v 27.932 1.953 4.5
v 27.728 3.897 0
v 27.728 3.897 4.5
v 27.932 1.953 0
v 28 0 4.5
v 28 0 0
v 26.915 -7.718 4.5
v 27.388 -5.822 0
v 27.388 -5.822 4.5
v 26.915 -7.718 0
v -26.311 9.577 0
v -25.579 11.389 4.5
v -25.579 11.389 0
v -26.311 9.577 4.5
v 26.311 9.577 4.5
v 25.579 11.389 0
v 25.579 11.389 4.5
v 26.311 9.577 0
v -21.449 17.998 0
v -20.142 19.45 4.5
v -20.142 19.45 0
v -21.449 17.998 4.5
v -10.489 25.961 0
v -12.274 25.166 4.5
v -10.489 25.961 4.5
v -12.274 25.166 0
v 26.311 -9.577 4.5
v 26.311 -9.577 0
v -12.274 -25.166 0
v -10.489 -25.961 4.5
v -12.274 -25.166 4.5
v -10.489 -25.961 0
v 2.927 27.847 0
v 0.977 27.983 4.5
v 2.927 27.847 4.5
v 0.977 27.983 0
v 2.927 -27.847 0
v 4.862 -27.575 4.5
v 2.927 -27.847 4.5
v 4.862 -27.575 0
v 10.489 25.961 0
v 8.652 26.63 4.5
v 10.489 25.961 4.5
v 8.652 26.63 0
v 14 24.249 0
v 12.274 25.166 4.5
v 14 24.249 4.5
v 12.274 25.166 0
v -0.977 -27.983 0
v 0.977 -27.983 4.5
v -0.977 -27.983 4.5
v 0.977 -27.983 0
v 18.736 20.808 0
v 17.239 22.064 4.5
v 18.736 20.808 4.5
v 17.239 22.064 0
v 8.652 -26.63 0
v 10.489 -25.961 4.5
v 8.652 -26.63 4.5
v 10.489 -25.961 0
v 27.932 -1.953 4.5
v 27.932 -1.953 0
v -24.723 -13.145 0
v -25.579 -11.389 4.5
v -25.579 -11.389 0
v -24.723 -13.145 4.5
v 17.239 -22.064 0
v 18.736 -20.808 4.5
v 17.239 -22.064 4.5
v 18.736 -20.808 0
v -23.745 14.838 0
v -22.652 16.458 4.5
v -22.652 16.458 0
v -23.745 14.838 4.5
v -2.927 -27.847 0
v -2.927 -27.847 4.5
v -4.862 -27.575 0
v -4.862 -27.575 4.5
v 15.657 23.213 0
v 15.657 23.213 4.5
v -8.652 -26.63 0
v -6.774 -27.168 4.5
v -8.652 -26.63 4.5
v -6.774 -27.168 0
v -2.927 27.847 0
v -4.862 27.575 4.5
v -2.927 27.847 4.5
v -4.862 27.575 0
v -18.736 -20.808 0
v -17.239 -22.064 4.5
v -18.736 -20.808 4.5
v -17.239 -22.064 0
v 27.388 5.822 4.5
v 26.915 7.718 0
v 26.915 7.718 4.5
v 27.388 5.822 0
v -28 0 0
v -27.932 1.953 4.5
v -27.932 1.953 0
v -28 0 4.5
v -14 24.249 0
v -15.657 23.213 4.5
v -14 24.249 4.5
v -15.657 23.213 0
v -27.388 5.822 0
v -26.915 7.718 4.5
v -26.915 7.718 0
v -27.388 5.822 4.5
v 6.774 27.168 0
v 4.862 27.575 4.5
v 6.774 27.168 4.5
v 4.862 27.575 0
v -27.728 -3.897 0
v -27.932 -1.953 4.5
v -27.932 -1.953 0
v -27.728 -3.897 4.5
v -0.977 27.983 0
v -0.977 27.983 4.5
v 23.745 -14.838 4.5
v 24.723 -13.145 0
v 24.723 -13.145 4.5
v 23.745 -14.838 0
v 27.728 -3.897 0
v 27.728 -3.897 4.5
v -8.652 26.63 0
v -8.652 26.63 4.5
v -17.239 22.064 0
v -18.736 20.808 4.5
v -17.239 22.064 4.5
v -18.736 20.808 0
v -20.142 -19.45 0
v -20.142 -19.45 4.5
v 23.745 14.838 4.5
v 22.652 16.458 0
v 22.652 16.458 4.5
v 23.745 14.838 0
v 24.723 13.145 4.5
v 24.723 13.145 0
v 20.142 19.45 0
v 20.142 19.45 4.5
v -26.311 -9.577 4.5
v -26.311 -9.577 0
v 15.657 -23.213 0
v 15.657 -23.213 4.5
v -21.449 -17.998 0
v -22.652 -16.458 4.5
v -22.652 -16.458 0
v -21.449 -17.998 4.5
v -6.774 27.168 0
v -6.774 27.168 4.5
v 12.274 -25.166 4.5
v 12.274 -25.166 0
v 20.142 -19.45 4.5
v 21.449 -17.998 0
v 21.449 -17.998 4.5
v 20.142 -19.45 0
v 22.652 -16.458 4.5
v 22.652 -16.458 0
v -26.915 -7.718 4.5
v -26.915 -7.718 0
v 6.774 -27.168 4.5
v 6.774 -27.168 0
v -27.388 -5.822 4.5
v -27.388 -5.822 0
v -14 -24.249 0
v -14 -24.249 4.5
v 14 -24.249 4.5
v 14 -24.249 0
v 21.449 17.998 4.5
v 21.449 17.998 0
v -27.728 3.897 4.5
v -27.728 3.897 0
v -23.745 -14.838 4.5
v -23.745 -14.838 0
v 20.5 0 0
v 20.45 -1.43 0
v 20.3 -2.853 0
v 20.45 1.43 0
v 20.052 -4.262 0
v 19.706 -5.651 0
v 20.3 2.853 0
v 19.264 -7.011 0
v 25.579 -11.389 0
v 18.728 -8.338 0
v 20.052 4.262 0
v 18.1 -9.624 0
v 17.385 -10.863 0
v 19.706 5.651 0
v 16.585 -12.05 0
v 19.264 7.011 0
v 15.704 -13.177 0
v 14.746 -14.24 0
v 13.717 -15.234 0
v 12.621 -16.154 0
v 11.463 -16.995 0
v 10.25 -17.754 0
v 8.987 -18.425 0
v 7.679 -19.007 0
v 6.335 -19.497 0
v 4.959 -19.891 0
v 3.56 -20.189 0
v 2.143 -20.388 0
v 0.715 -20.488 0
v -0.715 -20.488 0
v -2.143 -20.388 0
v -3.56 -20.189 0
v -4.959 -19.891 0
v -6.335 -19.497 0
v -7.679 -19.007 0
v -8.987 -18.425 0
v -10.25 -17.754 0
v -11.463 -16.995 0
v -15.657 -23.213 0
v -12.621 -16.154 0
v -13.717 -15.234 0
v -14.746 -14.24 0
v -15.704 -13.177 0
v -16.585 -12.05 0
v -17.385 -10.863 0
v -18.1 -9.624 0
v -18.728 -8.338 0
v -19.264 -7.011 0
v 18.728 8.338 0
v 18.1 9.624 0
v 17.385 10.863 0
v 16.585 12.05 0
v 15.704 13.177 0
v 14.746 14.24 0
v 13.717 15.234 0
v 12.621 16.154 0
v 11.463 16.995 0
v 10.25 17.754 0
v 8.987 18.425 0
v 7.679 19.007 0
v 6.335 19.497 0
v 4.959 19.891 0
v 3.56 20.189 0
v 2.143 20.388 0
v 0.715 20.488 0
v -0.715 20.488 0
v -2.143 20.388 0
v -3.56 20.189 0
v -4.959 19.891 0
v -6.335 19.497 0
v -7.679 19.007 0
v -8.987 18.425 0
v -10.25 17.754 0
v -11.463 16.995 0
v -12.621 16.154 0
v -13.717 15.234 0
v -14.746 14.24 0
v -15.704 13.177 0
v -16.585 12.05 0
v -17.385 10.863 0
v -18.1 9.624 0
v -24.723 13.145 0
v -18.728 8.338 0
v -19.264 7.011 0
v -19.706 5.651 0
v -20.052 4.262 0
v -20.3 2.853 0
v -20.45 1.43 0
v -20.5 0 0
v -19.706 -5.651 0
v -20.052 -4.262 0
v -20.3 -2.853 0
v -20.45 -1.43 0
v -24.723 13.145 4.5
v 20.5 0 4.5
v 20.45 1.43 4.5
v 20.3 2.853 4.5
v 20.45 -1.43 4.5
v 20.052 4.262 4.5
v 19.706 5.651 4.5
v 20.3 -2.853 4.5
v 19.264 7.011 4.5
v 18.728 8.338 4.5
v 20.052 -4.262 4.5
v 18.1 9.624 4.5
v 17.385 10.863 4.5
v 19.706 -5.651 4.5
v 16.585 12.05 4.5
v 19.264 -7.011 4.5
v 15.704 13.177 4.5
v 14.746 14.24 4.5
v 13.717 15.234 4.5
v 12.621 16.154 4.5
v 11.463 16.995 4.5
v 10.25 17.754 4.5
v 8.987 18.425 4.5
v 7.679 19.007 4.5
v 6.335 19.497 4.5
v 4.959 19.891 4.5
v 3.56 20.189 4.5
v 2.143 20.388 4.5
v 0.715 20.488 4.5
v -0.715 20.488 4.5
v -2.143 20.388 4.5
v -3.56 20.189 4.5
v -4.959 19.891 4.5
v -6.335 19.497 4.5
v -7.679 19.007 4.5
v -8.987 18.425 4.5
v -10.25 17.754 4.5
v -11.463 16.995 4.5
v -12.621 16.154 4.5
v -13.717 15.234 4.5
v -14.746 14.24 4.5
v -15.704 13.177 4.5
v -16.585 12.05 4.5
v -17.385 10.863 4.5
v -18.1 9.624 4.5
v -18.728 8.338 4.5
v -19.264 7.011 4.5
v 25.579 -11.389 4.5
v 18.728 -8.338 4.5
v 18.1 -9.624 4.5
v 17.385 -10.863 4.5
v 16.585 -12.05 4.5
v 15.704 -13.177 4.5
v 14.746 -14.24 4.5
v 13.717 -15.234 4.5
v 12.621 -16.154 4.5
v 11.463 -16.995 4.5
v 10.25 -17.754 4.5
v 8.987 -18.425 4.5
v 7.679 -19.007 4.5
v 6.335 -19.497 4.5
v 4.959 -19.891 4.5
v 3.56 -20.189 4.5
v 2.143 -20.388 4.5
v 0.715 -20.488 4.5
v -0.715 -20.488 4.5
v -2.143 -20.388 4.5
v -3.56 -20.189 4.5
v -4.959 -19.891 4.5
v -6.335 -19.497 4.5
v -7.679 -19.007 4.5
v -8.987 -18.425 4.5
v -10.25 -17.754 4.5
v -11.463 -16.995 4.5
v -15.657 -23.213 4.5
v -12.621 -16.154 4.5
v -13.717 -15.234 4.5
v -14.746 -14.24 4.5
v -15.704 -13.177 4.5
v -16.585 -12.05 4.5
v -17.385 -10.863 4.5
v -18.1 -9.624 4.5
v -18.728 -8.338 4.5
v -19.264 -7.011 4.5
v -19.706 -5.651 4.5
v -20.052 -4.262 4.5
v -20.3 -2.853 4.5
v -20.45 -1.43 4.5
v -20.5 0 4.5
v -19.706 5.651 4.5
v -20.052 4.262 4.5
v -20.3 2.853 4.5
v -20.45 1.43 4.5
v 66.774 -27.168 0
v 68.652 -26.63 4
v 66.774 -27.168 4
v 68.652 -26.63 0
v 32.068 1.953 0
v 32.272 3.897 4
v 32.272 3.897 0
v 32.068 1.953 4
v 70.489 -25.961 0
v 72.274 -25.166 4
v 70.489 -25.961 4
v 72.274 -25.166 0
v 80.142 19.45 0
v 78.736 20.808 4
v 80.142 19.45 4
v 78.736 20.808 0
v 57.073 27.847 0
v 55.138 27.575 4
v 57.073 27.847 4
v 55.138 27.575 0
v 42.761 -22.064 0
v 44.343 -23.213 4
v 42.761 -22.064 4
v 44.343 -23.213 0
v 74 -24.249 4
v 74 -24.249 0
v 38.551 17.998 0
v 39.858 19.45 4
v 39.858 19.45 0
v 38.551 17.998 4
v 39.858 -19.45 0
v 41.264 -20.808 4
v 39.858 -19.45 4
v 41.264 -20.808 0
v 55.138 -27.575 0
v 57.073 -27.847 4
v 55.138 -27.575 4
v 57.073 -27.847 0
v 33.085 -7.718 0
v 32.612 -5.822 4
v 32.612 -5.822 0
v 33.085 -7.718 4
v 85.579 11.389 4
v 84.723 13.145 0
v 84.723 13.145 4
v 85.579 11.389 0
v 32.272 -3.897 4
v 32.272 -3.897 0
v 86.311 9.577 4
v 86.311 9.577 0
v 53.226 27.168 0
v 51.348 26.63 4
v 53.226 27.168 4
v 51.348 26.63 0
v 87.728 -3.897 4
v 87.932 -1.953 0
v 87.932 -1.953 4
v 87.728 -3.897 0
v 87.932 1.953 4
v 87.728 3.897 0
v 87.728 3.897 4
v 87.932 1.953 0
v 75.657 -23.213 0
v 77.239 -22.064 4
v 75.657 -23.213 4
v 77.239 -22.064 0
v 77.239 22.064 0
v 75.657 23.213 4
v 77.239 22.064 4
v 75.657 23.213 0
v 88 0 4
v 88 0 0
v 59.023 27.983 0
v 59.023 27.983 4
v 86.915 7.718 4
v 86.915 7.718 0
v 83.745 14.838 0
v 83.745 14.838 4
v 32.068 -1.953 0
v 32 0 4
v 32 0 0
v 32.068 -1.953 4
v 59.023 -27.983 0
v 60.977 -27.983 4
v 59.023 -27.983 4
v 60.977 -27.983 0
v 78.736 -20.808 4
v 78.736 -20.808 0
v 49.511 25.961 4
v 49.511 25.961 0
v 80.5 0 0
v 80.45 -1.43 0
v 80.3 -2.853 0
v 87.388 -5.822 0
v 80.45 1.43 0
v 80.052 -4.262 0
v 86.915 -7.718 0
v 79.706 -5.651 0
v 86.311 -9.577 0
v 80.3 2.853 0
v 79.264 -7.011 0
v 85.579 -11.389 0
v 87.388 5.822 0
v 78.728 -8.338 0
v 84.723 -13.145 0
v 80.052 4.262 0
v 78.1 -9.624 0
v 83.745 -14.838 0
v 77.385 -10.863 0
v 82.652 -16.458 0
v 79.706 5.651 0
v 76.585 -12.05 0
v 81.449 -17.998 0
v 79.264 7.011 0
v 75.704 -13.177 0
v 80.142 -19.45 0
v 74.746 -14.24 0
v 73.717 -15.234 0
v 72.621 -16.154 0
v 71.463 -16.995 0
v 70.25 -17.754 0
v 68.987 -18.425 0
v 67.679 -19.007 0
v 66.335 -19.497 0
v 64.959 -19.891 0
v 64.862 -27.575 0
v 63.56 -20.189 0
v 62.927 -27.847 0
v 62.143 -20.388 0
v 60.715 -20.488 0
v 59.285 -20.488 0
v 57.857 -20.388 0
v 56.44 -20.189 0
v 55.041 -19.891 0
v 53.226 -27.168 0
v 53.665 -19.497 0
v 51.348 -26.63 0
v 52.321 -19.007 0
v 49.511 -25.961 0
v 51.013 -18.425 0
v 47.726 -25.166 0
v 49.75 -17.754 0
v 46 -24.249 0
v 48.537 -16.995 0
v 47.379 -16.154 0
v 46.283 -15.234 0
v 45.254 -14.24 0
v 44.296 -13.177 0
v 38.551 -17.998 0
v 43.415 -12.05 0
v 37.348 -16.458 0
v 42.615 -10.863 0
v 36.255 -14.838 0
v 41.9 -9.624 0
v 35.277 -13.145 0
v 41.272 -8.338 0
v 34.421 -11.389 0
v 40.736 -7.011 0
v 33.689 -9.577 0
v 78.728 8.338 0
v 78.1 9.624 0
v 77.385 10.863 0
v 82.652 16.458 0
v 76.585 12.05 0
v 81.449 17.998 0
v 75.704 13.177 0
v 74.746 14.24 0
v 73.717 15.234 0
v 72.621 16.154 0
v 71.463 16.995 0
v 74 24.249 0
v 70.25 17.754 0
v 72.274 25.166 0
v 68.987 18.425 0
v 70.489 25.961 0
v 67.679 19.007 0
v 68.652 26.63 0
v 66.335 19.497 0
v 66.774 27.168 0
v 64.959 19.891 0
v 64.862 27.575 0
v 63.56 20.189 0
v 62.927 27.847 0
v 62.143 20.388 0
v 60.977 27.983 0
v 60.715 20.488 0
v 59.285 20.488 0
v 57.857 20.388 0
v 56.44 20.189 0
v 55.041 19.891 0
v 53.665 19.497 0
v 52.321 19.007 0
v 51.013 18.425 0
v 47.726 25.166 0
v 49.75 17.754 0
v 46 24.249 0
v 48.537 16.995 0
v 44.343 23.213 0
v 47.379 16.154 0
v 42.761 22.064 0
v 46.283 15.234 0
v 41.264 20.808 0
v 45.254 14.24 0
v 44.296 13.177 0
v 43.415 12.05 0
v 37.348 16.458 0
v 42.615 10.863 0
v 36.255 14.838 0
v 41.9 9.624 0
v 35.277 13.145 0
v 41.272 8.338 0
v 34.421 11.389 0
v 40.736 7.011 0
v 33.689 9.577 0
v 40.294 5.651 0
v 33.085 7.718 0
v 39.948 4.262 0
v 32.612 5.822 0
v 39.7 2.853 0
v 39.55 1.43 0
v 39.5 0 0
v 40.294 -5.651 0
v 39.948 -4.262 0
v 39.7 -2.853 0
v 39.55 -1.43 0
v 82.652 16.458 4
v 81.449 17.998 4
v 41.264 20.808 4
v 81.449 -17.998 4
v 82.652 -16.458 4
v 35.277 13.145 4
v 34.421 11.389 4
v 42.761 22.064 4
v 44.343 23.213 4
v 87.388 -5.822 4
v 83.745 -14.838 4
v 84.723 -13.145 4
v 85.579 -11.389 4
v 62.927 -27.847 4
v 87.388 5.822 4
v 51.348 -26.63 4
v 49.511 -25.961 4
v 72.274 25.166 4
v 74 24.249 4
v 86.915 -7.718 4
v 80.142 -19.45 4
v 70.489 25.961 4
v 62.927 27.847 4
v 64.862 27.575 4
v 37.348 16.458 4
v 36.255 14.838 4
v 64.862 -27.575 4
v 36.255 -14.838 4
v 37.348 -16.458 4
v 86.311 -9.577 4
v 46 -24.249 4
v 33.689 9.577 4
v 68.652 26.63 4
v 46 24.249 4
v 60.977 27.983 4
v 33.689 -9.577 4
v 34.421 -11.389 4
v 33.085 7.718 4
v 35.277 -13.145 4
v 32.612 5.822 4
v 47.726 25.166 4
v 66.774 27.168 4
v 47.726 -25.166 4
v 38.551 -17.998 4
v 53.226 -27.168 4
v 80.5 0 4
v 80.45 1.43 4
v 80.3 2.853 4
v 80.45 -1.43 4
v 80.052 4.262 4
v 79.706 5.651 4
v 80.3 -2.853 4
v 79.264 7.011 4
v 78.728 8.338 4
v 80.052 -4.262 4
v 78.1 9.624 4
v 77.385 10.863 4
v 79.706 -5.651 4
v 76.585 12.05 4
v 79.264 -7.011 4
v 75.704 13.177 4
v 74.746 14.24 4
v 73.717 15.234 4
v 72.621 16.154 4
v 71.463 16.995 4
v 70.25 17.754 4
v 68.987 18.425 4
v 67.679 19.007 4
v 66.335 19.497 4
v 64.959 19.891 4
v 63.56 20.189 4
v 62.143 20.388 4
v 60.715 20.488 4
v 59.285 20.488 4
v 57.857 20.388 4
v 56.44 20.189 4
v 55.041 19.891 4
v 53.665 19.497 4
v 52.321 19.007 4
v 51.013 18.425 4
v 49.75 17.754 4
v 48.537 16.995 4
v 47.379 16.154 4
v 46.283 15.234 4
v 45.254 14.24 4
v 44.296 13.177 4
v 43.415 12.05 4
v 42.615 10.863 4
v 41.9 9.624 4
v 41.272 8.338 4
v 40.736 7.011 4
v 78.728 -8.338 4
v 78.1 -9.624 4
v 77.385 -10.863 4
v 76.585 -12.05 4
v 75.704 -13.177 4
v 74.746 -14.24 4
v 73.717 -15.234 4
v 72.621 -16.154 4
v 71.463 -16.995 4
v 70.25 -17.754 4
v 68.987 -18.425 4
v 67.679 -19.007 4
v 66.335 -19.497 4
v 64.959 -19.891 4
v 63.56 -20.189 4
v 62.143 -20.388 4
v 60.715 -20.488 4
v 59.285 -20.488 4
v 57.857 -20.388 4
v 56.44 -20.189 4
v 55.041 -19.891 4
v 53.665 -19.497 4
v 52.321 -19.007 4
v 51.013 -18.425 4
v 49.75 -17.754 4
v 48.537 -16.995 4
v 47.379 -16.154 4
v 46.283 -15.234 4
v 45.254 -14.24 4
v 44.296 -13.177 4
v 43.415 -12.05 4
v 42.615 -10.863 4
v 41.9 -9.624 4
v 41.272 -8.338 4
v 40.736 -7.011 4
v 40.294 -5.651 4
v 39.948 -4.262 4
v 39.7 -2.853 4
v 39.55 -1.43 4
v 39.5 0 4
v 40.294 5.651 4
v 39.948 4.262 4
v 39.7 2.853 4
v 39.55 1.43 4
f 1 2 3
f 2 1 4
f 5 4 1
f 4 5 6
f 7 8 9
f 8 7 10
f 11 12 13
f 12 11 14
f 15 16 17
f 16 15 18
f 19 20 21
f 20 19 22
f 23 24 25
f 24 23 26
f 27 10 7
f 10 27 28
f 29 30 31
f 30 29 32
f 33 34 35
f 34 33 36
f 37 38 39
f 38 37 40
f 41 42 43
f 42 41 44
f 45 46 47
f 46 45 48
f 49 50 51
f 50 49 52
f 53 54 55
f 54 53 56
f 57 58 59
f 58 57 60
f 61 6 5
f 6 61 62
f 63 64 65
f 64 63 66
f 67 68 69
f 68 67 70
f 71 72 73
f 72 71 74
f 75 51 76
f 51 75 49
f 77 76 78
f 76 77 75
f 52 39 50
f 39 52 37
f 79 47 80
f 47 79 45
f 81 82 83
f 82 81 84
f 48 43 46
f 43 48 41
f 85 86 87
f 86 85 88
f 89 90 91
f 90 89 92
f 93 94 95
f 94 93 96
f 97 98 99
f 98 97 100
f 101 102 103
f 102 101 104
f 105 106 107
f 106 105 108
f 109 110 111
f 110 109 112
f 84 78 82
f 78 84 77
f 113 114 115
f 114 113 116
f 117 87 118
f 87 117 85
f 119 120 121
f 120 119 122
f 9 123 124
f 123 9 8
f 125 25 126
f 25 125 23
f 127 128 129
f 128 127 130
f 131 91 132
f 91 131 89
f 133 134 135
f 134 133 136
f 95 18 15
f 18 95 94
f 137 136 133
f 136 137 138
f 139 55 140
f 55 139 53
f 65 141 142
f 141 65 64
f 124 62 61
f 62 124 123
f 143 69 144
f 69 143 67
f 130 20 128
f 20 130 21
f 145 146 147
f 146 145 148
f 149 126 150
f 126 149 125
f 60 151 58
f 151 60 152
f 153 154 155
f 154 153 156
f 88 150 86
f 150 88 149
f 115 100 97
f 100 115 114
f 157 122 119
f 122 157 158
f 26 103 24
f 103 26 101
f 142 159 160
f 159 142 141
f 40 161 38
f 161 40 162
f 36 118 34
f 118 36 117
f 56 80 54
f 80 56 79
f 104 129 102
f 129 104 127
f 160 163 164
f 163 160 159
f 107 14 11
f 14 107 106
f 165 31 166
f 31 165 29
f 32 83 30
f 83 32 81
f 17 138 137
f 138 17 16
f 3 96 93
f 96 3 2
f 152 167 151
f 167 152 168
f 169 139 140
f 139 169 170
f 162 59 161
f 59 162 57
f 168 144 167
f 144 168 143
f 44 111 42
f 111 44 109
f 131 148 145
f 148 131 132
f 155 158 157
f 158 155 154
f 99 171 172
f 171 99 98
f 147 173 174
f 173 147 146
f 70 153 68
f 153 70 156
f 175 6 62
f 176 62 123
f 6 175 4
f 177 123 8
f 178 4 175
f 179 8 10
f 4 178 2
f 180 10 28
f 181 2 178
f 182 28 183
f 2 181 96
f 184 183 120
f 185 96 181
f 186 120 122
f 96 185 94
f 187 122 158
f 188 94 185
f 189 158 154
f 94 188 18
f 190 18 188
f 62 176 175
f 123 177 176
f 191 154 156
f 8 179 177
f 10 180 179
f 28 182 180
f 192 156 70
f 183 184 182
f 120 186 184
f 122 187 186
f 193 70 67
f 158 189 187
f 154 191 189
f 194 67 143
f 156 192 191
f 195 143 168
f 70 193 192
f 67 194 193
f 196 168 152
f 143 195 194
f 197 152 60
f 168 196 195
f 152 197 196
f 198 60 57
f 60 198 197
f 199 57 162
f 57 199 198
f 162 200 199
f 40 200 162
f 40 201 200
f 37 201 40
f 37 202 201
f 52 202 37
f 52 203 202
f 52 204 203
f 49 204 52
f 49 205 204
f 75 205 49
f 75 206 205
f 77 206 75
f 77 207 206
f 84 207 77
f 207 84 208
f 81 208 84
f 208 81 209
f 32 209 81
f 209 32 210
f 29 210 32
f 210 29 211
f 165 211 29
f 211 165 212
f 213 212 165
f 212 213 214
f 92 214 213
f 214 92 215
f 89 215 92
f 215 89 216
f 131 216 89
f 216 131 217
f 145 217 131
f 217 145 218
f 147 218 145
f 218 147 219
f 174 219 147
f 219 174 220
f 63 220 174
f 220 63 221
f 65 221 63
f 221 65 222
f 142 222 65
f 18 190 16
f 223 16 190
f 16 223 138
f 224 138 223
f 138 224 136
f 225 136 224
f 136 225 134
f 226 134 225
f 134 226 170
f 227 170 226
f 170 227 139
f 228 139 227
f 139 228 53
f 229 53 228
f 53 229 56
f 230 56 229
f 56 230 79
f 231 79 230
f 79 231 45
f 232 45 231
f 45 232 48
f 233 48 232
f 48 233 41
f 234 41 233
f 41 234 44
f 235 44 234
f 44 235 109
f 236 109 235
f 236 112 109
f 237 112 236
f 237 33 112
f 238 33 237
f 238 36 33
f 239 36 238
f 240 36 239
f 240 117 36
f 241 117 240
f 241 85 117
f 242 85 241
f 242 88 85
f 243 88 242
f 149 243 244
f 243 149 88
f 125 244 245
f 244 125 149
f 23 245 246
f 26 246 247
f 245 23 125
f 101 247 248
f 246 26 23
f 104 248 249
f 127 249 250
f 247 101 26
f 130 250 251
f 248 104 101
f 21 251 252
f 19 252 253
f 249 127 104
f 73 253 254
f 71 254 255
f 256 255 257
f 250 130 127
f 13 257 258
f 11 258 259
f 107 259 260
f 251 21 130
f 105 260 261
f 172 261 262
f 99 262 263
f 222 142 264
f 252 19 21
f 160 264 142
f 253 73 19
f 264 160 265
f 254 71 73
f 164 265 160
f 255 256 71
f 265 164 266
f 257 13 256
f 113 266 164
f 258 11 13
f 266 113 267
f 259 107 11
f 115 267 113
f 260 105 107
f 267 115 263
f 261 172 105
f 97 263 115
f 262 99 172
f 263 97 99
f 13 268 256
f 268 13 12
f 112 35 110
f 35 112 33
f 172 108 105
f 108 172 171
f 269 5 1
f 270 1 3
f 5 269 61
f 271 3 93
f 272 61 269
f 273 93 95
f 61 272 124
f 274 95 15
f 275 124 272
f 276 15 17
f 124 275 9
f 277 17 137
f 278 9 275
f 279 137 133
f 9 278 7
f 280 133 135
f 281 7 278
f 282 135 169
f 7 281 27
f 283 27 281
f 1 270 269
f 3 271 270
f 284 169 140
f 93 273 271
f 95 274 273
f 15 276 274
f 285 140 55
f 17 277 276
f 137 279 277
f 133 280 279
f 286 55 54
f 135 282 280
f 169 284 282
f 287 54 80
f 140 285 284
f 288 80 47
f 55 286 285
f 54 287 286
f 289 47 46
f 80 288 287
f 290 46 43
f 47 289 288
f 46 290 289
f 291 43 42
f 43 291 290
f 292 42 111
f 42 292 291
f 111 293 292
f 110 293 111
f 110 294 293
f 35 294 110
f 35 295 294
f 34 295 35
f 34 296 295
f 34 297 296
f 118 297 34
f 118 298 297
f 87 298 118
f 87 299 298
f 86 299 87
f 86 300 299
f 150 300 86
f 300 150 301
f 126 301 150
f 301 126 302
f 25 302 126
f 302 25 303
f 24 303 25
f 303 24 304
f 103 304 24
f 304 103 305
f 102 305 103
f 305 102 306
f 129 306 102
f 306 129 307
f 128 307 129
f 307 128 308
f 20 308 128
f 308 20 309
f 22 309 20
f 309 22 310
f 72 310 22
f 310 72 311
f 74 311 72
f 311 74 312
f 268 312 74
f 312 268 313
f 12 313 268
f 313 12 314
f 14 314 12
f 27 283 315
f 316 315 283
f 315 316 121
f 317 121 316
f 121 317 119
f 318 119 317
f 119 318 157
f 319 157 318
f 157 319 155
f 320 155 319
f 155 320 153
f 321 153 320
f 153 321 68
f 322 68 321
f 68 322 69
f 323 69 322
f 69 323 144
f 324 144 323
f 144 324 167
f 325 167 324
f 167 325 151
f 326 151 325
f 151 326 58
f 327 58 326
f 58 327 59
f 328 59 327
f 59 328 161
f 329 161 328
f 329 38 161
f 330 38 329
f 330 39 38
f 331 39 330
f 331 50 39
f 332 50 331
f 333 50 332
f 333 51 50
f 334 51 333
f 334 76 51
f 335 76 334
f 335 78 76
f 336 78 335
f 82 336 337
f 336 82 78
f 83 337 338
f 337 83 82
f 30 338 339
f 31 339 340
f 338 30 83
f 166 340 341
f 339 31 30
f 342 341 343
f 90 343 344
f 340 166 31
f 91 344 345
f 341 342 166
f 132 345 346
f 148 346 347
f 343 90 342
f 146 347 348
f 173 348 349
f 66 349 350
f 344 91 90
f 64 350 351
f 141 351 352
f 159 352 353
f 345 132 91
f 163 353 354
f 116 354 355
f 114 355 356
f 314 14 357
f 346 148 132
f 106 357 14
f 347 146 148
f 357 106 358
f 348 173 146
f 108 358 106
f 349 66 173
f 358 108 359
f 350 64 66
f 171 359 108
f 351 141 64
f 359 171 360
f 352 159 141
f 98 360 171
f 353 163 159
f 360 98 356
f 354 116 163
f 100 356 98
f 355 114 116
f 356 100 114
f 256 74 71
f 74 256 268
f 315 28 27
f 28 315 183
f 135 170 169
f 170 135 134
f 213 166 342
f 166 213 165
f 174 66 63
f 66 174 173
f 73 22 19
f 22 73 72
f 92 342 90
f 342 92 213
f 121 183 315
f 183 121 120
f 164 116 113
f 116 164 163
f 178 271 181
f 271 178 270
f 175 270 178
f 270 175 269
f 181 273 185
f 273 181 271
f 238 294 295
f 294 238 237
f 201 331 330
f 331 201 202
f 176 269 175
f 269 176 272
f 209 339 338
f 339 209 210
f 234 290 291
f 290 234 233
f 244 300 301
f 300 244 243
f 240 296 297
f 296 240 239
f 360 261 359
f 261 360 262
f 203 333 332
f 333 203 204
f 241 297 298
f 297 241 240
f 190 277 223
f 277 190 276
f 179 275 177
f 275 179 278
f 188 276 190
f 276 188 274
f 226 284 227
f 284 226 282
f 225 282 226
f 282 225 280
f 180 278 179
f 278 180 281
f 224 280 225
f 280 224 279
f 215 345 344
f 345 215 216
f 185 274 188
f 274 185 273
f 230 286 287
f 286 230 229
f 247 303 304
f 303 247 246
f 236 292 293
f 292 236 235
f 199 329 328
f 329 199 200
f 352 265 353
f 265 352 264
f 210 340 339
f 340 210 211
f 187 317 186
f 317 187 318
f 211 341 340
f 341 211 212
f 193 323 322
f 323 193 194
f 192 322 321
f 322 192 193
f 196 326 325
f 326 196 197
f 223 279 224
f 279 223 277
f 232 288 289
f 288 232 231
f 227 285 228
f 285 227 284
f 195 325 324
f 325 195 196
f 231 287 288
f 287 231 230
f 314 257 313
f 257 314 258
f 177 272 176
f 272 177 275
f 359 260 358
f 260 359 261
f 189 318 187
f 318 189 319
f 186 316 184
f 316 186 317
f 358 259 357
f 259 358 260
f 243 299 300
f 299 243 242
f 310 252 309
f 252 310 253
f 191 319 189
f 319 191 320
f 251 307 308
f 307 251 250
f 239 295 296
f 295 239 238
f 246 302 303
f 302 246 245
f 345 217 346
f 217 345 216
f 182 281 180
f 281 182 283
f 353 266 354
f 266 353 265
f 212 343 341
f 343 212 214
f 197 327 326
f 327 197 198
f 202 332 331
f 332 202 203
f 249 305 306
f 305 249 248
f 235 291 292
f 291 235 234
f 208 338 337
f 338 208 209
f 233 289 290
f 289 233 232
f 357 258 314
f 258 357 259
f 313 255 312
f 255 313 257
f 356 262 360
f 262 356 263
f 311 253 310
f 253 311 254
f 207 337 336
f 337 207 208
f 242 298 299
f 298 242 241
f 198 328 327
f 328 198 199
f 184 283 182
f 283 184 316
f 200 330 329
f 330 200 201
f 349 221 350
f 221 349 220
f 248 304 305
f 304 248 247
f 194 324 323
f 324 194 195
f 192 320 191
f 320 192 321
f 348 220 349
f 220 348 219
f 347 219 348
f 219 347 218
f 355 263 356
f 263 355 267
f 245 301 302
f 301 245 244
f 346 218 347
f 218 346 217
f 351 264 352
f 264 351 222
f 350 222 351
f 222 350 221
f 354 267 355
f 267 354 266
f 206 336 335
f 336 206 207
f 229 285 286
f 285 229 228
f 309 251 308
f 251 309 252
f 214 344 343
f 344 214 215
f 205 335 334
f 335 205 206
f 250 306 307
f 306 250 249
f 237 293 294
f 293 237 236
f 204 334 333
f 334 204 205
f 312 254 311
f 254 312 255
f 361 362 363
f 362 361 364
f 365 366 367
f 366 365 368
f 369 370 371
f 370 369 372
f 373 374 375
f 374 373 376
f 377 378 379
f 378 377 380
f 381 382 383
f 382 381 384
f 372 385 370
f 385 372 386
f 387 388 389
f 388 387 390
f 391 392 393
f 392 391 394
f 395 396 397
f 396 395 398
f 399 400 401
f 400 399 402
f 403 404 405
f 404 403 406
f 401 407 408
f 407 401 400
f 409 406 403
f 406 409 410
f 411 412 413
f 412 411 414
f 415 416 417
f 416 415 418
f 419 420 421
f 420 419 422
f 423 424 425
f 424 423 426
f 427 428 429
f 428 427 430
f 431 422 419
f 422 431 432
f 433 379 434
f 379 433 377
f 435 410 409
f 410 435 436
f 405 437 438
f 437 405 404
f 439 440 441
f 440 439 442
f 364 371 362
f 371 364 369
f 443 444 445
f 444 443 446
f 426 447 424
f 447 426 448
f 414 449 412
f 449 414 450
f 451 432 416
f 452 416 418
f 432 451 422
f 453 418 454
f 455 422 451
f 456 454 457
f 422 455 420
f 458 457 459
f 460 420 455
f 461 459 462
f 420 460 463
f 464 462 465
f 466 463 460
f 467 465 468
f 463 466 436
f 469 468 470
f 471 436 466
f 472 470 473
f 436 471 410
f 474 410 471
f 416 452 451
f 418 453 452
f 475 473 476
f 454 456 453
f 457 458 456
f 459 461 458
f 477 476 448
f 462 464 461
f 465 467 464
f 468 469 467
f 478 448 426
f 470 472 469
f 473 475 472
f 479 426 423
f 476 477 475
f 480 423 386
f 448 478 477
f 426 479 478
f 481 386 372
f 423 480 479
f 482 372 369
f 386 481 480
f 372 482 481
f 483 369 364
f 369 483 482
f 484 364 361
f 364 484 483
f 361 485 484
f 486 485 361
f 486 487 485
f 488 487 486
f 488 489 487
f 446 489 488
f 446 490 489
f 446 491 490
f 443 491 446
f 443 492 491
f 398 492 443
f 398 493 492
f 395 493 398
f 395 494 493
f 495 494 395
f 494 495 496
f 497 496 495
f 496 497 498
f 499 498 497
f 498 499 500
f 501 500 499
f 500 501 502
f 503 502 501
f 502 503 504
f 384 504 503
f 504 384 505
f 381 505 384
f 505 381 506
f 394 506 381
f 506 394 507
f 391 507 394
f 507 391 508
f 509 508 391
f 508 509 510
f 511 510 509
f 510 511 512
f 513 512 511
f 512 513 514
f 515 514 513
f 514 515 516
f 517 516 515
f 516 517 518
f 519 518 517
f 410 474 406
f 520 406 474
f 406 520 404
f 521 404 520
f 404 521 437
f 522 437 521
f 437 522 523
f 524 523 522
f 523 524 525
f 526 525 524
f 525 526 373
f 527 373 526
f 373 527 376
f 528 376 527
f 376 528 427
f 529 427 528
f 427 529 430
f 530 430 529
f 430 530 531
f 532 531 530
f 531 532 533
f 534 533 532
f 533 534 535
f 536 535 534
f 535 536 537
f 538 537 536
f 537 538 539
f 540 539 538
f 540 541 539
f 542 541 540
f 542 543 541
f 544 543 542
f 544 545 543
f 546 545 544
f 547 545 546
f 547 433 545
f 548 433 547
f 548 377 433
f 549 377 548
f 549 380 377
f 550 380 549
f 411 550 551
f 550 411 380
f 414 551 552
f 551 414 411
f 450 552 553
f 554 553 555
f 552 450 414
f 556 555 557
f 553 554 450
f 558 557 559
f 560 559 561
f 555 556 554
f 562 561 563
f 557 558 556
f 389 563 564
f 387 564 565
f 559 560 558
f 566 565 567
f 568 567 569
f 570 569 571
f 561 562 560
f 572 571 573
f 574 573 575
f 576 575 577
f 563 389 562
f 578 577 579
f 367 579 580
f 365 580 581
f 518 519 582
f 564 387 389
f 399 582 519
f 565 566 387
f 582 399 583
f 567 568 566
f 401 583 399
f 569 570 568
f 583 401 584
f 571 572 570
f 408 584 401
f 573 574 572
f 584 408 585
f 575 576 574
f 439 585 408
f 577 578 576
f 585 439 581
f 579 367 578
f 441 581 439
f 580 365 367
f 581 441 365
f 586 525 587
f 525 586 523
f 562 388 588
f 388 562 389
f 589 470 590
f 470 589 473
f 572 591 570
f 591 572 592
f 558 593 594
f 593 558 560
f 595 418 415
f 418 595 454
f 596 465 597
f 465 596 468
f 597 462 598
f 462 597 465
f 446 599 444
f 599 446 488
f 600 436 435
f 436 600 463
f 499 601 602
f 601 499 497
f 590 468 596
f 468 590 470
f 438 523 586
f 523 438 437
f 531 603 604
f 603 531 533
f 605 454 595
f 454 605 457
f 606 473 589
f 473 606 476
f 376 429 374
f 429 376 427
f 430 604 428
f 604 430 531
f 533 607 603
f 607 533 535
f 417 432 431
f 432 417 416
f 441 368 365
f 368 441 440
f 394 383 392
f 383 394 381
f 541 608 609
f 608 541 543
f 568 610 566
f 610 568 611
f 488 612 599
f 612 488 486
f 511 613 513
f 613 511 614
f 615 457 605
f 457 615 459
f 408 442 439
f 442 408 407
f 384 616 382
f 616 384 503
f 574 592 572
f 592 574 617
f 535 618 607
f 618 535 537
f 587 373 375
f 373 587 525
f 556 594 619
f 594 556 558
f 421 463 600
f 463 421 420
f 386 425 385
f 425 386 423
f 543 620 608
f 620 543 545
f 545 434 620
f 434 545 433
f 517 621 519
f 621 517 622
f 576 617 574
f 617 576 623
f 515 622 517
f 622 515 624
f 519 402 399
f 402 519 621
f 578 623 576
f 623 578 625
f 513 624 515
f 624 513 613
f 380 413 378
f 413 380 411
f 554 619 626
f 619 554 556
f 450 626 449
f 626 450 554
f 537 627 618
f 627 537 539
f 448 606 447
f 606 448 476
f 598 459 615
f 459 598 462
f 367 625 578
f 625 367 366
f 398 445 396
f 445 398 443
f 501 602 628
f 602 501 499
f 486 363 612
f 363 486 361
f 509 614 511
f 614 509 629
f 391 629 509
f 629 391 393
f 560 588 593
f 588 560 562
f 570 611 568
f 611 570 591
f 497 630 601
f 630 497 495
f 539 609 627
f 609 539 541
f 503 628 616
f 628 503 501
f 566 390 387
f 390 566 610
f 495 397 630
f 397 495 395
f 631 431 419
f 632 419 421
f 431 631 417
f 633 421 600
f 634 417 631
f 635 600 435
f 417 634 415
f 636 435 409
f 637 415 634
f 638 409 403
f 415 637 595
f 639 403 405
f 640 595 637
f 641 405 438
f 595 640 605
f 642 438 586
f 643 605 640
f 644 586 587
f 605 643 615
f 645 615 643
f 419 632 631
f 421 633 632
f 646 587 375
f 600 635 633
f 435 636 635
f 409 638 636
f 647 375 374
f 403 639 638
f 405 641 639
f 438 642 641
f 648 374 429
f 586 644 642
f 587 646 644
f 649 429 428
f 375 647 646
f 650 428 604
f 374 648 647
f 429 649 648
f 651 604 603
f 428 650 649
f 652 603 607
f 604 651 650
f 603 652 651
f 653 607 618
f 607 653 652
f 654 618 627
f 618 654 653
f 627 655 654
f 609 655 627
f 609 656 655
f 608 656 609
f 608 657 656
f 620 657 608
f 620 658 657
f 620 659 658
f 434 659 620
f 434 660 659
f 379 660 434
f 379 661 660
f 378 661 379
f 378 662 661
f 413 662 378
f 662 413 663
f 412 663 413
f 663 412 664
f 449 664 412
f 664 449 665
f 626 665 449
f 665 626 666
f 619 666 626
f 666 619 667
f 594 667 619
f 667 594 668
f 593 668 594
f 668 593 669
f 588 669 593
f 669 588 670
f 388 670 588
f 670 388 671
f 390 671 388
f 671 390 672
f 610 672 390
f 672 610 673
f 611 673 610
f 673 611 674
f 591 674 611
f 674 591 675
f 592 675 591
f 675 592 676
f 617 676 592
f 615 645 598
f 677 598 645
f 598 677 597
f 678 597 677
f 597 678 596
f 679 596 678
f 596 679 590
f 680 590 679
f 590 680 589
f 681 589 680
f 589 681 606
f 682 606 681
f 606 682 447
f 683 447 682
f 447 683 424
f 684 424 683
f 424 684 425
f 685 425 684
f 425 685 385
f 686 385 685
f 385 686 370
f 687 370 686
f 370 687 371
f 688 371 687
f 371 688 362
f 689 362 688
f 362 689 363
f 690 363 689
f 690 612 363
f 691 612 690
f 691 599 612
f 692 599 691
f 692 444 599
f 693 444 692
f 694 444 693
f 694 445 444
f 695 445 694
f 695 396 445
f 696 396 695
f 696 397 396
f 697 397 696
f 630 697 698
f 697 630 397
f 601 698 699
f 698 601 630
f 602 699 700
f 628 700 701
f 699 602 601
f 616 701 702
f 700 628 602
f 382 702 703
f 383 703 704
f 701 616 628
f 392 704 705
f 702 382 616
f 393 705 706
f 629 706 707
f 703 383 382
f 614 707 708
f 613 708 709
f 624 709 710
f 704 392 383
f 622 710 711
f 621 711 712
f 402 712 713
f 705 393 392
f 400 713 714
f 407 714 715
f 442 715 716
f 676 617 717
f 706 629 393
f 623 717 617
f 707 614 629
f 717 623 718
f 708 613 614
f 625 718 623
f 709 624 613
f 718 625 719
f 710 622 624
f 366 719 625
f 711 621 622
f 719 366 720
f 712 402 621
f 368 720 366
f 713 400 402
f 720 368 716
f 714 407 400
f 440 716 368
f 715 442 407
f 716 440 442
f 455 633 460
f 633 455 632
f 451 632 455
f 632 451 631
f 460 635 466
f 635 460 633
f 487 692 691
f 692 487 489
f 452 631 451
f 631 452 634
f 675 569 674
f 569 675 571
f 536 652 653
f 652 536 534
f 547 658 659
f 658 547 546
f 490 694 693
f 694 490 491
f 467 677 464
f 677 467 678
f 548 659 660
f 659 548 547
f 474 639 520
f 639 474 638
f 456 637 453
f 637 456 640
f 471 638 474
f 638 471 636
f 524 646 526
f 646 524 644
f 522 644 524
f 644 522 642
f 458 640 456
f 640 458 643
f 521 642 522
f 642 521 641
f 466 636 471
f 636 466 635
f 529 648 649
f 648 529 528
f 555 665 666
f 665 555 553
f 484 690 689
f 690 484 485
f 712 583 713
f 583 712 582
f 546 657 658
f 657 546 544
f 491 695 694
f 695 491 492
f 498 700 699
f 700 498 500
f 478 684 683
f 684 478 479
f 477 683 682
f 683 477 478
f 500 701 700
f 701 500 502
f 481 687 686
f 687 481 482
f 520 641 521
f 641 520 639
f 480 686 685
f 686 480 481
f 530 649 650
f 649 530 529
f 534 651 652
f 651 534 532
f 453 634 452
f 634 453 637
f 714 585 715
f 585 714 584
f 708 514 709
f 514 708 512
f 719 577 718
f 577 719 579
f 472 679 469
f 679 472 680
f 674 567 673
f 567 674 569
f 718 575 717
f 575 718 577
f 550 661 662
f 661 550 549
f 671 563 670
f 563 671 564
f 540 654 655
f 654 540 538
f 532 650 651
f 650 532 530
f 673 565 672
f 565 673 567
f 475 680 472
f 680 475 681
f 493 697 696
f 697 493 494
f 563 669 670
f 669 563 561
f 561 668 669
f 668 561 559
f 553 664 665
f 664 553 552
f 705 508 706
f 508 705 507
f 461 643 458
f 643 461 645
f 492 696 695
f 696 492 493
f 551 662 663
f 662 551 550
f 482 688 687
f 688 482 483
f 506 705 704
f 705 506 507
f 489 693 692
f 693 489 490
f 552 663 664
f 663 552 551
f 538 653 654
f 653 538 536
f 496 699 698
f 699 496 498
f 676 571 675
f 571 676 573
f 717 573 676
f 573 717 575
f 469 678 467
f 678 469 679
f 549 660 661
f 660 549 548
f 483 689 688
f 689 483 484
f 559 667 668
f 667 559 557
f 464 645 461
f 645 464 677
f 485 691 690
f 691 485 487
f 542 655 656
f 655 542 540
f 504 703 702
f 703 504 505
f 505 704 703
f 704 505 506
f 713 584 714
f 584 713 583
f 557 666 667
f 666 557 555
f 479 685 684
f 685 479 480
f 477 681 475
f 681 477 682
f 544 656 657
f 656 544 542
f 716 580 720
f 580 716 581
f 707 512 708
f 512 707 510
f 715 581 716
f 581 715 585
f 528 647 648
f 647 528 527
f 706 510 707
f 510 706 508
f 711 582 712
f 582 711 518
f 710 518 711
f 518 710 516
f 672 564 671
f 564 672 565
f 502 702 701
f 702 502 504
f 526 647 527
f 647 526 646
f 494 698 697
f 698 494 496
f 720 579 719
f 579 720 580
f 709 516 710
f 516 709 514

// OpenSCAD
$fn = 90;

ring(4.5);

translate([60, 0, 0])
	ring(4);


module ring(height = 5){
	difference(){
		cylinder(d=56, h=height);
		#cylinder(d=41, h=height);
	}
}
